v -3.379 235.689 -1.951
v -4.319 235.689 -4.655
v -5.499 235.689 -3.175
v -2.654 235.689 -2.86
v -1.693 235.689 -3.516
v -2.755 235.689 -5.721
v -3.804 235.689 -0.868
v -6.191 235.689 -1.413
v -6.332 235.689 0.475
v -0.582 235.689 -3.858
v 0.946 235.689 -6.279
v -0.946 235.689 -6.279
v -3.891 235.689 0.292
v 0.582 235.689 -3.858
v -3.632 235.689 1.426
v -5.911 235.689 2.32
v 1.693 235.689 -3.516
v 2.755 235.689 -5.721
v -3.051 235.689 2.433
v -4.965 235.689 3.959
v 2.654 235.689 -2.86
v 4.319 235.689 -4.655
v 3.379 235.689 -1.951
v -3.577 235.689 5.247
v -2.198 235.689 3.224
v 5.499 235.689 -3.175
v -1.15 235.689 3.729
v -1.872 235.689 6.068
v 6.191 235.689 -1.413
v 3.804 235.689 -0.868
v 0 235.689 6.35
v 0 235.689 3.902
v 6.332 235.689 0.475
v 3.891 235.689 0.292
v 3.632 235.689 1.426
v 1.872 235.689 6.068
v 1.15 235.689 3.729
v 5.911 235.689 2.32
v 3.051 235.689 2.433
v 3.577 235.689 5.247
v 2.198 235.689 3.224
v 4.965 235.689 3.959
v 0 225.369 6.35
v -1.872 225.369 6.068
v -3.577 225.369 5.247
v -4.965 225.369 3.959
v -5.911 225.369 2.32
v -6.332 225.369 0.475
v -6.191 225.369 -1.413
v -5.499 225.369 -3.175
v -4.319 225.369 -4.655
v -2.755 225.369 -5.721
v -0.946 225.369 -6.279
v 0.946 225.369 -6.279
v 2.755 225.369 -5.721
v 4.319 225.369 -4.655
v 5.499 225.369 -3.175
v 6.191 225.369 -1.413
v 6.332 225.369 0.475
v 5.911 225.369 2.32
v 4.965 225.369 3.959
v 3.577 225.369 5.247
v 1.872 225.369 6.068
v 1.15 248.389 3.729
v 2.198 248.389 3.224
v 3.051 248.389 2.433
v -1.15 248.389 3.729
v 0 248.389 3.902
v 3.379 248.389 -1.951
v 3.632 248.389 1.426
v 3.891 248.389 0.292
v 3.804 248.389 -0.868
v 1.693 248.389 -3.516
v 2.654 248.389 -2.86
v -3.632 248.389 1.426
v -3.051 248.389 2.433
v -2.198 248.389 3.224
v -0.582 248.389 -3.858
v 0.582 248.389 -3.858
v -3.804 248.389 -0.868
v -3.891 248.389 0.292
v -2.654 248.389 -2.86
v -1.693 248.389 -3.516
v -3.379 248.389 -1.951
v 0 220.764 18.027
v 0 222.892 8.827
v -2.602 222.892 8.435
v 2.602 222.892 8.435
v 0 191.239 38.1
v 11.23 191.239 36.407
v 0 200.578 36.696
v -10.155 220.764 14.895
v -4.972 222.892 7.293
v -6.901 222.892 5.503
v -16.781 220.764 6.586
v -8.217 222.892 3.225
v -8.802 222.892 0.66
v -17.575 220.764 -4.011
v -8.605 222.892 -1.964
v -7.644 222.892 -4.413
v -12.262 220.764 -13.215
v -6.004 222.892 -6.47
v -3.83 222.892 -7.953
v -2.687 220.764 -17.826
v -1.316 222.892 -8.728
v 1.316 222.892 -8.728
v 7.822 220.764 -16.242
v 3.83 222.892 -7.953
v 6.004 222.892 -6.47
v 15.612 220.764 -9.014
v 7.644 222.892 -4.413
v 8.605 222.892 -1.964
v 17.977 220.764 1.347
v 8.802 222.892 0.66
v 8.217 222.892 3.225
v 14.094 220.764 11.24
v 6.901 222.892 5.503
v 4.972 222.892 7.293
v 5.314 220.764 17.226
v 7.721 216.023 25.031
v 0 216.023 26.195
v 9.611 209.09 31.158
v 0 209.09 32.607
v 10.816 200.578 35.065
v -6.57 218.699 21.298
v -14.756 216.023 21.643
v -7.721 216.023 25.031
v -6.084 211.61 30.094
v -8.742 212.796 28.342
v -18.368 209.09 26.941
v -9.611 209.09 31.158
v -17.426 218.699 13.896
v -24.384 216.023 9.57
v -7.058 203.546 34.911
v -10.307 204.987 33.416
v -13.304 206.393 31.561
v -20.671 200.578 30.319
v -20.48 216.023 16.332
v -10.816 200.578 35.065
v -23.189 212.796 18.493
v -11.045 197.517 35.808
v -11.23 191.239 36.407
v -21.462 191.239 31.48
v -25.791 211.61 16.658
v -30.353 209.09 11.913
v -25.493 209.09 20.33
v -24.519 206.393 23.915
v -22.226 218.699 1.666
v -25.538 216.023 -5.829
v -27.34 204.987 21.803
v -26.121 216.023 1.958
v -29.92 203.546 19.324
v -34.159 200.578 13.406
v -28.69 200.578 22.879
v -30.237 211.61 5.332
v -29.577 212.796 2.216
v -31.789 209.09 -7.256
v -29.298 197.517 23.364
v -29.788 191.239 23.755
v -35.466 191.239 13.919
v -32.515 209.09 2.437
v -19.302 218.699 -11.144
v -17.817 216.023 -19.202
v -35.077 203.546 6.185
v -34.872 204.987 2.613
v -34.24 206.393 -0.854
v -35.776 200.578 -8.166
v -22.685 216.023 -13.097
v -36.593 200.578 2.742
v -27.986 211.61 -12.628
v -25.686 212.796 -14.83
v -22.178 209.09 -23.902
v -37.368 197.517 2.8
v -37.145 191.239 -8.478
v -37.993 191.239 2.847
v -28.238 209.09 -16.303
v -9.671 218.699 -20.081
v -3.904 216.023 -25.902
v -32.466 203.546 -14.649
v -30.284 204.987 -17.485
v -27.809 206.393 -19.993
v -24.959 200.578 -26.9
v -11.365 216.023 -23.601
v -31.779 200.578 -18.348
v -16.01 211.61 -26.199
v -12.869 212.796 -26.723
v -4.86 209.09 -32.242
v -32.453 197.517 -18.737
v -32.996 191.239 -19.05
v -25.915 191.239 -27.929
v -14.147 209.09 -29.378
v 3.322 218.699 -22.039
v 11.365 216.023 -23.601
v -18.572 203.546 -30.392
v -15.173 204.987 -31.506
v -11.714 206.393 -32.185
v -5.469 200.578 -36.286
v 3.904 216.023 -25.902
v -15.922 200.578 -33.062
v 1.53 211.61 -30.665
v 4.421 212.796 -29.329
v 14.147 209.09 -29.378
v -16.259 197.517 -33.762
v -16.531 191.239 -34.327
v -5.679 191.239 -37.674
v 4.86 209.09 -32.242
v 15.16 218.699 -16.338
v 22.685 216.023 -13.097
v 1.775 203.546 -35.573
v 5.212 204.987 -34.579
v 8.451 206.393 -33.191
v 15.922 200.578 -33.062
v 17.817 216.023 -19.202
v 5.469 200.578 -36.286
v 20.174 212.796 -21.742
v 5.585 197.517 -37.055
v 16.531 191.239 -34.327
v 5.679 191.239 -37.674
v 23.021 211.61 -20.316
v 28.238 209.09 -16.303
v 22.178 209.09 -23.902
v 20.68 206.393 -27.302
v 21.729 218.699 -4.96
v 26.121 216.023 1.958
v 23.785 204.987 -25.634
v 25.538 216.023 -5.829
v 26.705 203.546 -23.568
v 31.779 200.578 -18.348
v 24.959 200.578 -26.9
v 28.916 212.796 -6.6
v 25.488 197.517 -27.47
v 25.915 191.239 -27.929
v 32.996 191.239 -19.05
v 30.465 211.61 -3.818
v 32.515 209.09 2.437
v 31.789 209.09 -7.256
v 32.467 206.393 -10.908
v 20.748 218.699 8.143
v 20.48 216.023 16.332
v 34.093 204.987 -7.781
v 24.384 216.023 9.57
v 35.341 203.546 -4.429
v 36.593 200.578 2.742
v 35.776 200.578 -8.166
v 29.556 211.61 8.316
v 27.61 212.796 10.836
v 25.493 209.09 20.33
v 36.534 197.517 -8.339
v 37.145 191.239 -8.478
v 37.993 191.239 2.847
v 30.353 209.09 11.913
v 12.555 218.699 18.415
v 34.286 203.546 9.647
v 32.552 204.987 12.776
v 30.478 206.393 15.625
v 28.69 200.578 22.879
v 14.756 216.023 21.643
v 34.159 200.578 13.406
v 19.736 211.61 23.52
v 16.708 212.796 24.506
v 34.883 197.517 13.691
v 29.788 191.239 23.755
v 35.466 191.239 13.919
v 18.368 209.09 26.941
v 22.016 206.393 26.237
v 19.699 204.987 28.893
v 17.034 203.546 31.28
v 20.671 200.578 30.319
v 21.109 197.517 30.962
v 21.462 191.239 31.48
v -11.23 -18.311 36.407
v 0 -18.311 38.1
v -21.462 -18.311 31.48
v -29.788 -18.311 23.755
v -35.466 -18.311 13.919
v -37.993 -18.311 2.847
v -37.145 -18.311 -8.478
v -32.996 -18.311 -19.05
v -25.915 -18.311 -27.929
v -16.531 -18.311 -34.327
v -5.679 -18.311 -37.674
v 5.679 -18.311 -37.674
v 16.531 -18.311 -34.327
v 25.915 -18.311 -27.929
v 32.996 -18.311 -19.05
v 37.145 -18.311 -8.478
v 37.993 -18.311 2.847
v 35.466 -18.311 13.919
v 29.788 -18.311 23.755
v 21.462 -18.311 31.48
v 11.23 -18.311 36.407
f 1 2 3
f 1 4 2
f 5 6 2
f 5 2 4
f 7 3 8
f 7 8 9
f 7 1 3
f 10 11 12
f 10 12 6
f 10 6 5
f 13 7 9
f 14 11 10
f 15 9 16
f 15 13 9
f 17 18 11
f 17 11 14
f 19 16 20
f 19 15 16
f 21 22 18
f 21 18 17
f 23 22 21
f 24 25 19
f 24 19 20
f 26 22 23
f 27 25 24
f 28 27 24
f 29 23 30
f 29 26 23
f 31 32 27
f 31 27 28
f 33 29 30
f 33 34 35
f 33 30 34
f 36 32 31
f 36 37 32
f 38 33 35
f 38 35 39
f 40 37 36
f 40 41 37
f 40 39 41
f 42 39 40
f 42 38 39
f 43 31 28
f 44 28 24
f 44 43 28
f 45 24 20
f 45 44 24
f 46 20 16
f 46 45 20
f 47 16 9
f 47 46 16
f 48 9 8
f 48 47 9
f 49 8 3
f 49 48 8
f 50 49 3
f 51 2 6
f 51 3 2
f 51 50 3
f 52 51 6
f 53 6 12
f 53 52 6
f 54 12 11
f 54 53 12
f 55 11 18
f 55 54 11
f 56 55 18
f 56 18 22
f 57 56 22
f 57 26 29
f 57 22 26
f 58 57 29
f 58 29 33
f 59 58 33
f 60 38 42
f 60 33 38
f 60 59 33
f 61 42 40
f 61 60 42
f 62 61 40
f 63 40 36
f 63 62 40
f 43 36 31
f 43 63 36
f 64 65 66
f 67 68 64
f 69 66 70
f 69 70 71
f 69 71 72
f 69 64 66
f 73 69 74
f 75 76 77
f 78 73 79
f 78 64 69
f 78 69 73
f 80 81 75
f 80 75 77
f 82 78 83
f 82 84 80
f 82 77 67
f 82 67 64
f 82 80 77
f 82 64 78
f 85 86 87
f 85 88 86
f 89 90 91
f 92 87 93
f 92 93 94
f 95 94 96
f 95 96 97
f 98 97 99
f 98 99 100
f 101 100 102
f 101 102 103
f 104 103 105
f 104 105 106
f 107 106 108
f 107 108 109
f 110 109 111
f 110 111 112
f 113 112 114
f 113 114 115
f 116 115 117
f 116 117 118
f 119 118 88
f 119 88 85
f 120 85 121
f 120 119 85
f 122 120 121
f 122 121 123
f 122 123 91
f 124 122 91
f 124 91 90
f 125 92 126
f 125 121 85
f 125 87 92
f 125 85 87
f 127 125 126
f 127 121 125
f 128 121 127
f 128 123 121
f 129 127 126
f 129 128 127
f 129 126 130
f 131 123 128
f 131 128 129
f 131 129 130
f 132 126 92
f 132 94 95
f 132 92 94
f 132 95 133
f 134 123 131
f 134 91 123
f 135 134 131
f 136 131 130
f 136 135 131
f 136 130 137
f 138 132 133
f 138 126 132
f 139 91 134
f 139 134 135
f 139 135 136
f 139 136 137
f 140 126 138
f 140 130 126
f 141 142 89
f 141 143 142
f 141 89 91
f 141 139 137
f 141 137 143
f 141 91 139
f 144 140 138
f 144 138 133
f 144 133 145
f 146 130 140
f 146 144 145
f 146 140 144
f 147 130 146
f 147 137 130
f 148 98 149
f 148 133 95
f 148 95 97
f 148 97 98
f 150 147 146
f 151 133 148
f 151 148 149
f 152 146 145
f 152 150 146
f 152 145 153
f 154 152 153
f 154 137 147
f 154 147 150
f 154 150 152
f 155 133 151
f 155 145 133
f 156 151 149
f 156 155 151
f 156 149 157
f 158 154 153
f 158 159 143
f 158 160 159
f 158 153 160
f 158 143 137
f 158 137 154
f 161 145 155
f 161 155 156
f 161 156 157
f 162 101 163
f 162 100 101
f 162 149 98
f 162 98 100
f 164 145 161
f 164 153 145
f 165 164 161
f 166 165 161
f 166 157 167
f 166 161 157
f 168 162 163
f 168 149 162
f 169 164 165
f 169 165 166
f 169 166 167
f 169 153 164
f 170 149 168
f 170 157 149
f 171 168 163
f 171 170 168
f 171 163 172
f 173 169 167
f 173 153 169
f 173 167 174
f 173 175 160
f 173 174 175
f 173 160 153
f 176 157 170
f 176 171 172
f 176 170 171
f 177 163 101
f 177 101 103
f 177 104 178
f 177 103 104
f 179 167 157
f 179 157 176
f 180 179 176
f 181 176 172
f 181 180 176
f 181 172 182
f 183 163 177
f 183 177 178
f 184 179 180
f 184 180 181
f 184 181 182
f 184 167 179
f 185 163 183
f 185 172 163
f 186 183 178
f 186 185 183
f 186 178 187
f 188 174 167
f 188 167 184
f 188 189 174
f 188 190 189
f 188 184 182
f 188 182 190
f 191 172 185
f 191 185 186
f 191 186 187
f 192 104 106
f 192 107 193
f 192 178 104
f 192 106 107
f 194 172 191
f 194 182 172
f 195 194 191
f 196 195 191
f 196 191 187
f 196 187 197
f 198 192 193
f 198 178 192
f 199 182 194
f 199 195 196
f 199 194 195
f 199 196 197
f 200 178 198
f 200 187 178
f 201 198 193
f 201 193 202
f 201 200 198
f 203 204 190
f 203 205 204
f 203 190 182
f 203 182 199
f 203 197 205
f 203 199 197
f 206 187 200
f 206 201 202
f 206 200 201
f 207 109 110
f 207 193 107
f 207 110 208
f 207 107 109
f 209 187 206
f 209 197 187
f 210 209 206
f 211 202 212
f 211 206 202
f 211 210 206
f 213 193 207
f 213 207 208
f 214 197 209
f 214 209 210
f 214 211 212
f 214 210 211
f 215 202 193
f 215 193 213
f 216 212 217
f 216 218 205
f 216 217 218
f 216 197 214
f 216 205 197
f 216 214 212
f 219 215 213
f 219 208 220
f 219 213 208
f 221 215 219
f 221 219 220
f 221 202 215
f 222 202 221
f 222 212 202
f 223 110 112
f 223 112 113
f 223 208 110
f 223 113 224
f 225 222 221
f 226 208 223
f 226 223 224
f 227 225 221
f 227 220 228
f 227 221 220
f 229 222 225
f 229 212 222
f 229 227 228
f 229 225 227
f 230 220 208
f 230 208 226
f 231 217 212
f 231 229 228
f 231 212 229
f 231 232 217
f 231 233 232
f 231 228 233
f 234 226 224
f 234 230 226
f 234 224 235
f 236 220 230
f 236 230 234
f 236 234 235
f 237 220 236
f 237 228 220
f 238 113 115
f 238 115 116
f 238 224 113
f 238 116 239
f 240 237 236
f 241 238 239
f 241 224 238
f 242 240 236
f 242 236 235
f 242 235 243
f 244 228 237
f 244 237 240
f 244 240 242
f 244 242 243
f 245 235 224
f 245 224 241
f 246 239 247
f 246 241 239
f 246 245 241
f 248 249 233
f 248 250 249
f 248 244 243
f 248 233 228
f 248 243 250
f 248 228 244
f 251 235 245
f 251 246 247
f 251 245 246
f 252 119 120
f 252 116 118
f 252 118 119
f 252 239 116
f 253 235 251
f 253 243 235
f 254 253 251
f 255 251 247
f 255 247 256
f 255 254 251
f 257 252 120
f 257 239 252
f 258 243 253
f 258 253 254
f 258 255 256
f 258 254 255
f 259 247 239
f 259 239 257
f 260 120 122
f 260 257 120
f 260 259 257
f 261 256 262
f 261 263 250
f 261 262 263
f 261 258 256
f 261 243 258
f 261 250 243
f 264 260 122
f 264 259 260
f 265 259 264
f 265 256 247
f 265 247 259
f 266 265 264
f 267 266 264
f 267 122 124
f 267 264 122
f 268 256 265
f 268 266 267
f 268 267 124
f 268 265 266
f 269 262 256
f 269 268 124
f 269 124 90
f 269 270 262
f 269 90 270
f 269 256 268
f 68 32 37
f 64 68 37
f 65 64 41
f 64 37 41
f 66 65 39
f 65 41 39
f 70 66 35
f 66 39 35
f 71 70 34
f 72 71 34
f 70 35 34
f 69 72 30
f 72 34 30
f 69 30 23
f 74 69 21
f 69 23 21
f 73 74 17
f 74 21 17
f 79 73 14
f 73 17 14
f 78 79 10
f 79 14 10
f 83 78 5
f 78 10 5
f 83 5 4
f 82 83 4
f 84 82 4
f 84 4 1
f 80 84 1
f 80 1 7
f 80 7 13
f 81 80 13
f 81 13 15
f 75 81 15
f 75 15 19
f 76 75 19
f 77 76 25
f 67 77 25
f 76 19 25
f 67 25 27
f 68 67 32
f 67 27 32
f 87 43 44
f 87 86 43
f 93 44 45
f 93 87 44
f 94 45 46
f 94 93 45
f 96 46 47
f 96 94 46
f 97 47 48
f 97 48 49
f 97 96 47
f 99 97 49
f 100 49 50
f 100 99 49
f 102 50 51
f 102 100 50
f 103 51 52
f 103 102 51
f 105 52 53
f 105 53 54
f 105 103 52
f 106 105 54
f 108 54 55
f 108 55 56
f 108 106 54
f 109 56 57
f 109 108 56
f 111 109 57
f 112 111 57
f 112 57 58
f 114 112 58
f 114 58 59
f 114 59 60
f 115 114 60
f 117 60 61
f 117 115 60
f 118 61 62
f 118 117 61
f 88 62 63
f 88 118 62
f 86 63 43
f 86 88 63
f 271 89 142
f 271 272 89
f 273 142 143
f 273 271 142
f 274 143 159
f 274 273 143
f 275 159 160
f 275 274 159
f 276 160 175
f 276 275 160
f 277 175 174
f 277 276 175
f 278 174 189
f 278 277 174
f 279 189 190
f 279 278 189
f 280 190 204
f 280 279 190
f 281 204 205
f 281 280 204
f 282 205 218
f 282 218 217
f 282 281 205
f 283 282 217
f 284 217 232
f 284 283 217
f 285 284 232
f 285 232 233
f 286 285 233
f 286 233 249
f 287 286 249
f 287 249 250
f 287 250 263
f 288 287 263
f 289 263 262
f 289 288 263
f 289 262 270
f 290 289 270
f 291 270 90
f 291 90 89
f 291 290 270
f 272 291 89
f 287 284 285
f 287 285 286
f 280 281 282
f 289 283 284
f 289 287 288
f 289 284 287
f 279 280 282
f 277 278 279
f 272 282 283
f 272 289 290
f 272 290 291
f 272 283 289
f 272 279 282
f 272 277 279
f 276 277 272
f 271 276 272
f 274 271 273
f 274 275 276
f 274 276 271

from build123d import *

# Parameters (mm, degrees)
CHAMFER2_SIZE      = 2.38
CUT_EXTRUDE1_START = -12.7
SKETCH2_R          = 6.35
SKETCH2_R_2        = 3.902029093
CUT_EXTRUDE1_DEPTH = 12.7


with BuildPart() as part:
    # Sketch1 → Revolve1 (revolve)
    with BuildSketch(Plane.XY, mode=Mode.PRIVATE) as revolve1_sk:
        with BuildLine():
            Line((0, 248.389026298), (6.35, 248.389026298))
            Line((6.35, 248.389026298), (6.35, 222.989026298))
            ThreePointArc((6.35, 222.989026298), (28.800640303, 213.6896666), (38.1, 191.239026298))
            Line((38.1, 191.239026298), (38.1, -18.310973702))
            Line((38.1, -18.310973702), (0, -18.310973702))
            Line((0, -18.310973702), (0, 248.389026298))
        make_face()
    revolve(revolve1_sk.sketch.rotate(Axis((0, 337.108439078, 0), (0, -1, 0)), 90), axis=Axis((0, 337.108439078, 0), (0, -1, 0)))

    # Chamfer2
    # the kernel refuses this chamfer: 2.38 mm, written as the material it adds along each edge
    with BuildSketch(Plane(origin=(0, 222.989026298, 0), x_dir=(0, 0, 1), z_dir=(1, 0, 0))) as chamfer2_piece_1:
        with BuildLine():
            Line((6.35, -CHAMFER2_SIZE), (8.826750448, 0.096750448))
            ThreePointArc((8.826750448, 0.096750448), (7.624301016, 0.025582639), (6.35, 0))
            Line((6.35, 0), (6.35, -CHAMFER2_SIZE))
        make_face()
    revolve(axis=Axis((0, 222.989026298, 0), (0, -1, 0)))

    # Sketch2 → Cut-Extrude1 (cut)
    with BuildSketch(Plane(origin=(0, 248.389026298, 0), x_dir=(1, 0, 0), z_dir=(0, 1, 0)).offset(CUT_EXTRUDE1_START)):
        with Locations(Location((0, 0, 0), (0, 0, 270))):
            Circle(SKETCH2_R)
        with Locations(Location((0, 0, 0), (0, 0, 270))):
            Circle(SKETCH2_R_2, mode=Mode.SUBTRACT)
    extrude(amount=CUT_EXTRUDE1_DEPTH, mode=Mode.SUBTRACT)


solid = part.part
